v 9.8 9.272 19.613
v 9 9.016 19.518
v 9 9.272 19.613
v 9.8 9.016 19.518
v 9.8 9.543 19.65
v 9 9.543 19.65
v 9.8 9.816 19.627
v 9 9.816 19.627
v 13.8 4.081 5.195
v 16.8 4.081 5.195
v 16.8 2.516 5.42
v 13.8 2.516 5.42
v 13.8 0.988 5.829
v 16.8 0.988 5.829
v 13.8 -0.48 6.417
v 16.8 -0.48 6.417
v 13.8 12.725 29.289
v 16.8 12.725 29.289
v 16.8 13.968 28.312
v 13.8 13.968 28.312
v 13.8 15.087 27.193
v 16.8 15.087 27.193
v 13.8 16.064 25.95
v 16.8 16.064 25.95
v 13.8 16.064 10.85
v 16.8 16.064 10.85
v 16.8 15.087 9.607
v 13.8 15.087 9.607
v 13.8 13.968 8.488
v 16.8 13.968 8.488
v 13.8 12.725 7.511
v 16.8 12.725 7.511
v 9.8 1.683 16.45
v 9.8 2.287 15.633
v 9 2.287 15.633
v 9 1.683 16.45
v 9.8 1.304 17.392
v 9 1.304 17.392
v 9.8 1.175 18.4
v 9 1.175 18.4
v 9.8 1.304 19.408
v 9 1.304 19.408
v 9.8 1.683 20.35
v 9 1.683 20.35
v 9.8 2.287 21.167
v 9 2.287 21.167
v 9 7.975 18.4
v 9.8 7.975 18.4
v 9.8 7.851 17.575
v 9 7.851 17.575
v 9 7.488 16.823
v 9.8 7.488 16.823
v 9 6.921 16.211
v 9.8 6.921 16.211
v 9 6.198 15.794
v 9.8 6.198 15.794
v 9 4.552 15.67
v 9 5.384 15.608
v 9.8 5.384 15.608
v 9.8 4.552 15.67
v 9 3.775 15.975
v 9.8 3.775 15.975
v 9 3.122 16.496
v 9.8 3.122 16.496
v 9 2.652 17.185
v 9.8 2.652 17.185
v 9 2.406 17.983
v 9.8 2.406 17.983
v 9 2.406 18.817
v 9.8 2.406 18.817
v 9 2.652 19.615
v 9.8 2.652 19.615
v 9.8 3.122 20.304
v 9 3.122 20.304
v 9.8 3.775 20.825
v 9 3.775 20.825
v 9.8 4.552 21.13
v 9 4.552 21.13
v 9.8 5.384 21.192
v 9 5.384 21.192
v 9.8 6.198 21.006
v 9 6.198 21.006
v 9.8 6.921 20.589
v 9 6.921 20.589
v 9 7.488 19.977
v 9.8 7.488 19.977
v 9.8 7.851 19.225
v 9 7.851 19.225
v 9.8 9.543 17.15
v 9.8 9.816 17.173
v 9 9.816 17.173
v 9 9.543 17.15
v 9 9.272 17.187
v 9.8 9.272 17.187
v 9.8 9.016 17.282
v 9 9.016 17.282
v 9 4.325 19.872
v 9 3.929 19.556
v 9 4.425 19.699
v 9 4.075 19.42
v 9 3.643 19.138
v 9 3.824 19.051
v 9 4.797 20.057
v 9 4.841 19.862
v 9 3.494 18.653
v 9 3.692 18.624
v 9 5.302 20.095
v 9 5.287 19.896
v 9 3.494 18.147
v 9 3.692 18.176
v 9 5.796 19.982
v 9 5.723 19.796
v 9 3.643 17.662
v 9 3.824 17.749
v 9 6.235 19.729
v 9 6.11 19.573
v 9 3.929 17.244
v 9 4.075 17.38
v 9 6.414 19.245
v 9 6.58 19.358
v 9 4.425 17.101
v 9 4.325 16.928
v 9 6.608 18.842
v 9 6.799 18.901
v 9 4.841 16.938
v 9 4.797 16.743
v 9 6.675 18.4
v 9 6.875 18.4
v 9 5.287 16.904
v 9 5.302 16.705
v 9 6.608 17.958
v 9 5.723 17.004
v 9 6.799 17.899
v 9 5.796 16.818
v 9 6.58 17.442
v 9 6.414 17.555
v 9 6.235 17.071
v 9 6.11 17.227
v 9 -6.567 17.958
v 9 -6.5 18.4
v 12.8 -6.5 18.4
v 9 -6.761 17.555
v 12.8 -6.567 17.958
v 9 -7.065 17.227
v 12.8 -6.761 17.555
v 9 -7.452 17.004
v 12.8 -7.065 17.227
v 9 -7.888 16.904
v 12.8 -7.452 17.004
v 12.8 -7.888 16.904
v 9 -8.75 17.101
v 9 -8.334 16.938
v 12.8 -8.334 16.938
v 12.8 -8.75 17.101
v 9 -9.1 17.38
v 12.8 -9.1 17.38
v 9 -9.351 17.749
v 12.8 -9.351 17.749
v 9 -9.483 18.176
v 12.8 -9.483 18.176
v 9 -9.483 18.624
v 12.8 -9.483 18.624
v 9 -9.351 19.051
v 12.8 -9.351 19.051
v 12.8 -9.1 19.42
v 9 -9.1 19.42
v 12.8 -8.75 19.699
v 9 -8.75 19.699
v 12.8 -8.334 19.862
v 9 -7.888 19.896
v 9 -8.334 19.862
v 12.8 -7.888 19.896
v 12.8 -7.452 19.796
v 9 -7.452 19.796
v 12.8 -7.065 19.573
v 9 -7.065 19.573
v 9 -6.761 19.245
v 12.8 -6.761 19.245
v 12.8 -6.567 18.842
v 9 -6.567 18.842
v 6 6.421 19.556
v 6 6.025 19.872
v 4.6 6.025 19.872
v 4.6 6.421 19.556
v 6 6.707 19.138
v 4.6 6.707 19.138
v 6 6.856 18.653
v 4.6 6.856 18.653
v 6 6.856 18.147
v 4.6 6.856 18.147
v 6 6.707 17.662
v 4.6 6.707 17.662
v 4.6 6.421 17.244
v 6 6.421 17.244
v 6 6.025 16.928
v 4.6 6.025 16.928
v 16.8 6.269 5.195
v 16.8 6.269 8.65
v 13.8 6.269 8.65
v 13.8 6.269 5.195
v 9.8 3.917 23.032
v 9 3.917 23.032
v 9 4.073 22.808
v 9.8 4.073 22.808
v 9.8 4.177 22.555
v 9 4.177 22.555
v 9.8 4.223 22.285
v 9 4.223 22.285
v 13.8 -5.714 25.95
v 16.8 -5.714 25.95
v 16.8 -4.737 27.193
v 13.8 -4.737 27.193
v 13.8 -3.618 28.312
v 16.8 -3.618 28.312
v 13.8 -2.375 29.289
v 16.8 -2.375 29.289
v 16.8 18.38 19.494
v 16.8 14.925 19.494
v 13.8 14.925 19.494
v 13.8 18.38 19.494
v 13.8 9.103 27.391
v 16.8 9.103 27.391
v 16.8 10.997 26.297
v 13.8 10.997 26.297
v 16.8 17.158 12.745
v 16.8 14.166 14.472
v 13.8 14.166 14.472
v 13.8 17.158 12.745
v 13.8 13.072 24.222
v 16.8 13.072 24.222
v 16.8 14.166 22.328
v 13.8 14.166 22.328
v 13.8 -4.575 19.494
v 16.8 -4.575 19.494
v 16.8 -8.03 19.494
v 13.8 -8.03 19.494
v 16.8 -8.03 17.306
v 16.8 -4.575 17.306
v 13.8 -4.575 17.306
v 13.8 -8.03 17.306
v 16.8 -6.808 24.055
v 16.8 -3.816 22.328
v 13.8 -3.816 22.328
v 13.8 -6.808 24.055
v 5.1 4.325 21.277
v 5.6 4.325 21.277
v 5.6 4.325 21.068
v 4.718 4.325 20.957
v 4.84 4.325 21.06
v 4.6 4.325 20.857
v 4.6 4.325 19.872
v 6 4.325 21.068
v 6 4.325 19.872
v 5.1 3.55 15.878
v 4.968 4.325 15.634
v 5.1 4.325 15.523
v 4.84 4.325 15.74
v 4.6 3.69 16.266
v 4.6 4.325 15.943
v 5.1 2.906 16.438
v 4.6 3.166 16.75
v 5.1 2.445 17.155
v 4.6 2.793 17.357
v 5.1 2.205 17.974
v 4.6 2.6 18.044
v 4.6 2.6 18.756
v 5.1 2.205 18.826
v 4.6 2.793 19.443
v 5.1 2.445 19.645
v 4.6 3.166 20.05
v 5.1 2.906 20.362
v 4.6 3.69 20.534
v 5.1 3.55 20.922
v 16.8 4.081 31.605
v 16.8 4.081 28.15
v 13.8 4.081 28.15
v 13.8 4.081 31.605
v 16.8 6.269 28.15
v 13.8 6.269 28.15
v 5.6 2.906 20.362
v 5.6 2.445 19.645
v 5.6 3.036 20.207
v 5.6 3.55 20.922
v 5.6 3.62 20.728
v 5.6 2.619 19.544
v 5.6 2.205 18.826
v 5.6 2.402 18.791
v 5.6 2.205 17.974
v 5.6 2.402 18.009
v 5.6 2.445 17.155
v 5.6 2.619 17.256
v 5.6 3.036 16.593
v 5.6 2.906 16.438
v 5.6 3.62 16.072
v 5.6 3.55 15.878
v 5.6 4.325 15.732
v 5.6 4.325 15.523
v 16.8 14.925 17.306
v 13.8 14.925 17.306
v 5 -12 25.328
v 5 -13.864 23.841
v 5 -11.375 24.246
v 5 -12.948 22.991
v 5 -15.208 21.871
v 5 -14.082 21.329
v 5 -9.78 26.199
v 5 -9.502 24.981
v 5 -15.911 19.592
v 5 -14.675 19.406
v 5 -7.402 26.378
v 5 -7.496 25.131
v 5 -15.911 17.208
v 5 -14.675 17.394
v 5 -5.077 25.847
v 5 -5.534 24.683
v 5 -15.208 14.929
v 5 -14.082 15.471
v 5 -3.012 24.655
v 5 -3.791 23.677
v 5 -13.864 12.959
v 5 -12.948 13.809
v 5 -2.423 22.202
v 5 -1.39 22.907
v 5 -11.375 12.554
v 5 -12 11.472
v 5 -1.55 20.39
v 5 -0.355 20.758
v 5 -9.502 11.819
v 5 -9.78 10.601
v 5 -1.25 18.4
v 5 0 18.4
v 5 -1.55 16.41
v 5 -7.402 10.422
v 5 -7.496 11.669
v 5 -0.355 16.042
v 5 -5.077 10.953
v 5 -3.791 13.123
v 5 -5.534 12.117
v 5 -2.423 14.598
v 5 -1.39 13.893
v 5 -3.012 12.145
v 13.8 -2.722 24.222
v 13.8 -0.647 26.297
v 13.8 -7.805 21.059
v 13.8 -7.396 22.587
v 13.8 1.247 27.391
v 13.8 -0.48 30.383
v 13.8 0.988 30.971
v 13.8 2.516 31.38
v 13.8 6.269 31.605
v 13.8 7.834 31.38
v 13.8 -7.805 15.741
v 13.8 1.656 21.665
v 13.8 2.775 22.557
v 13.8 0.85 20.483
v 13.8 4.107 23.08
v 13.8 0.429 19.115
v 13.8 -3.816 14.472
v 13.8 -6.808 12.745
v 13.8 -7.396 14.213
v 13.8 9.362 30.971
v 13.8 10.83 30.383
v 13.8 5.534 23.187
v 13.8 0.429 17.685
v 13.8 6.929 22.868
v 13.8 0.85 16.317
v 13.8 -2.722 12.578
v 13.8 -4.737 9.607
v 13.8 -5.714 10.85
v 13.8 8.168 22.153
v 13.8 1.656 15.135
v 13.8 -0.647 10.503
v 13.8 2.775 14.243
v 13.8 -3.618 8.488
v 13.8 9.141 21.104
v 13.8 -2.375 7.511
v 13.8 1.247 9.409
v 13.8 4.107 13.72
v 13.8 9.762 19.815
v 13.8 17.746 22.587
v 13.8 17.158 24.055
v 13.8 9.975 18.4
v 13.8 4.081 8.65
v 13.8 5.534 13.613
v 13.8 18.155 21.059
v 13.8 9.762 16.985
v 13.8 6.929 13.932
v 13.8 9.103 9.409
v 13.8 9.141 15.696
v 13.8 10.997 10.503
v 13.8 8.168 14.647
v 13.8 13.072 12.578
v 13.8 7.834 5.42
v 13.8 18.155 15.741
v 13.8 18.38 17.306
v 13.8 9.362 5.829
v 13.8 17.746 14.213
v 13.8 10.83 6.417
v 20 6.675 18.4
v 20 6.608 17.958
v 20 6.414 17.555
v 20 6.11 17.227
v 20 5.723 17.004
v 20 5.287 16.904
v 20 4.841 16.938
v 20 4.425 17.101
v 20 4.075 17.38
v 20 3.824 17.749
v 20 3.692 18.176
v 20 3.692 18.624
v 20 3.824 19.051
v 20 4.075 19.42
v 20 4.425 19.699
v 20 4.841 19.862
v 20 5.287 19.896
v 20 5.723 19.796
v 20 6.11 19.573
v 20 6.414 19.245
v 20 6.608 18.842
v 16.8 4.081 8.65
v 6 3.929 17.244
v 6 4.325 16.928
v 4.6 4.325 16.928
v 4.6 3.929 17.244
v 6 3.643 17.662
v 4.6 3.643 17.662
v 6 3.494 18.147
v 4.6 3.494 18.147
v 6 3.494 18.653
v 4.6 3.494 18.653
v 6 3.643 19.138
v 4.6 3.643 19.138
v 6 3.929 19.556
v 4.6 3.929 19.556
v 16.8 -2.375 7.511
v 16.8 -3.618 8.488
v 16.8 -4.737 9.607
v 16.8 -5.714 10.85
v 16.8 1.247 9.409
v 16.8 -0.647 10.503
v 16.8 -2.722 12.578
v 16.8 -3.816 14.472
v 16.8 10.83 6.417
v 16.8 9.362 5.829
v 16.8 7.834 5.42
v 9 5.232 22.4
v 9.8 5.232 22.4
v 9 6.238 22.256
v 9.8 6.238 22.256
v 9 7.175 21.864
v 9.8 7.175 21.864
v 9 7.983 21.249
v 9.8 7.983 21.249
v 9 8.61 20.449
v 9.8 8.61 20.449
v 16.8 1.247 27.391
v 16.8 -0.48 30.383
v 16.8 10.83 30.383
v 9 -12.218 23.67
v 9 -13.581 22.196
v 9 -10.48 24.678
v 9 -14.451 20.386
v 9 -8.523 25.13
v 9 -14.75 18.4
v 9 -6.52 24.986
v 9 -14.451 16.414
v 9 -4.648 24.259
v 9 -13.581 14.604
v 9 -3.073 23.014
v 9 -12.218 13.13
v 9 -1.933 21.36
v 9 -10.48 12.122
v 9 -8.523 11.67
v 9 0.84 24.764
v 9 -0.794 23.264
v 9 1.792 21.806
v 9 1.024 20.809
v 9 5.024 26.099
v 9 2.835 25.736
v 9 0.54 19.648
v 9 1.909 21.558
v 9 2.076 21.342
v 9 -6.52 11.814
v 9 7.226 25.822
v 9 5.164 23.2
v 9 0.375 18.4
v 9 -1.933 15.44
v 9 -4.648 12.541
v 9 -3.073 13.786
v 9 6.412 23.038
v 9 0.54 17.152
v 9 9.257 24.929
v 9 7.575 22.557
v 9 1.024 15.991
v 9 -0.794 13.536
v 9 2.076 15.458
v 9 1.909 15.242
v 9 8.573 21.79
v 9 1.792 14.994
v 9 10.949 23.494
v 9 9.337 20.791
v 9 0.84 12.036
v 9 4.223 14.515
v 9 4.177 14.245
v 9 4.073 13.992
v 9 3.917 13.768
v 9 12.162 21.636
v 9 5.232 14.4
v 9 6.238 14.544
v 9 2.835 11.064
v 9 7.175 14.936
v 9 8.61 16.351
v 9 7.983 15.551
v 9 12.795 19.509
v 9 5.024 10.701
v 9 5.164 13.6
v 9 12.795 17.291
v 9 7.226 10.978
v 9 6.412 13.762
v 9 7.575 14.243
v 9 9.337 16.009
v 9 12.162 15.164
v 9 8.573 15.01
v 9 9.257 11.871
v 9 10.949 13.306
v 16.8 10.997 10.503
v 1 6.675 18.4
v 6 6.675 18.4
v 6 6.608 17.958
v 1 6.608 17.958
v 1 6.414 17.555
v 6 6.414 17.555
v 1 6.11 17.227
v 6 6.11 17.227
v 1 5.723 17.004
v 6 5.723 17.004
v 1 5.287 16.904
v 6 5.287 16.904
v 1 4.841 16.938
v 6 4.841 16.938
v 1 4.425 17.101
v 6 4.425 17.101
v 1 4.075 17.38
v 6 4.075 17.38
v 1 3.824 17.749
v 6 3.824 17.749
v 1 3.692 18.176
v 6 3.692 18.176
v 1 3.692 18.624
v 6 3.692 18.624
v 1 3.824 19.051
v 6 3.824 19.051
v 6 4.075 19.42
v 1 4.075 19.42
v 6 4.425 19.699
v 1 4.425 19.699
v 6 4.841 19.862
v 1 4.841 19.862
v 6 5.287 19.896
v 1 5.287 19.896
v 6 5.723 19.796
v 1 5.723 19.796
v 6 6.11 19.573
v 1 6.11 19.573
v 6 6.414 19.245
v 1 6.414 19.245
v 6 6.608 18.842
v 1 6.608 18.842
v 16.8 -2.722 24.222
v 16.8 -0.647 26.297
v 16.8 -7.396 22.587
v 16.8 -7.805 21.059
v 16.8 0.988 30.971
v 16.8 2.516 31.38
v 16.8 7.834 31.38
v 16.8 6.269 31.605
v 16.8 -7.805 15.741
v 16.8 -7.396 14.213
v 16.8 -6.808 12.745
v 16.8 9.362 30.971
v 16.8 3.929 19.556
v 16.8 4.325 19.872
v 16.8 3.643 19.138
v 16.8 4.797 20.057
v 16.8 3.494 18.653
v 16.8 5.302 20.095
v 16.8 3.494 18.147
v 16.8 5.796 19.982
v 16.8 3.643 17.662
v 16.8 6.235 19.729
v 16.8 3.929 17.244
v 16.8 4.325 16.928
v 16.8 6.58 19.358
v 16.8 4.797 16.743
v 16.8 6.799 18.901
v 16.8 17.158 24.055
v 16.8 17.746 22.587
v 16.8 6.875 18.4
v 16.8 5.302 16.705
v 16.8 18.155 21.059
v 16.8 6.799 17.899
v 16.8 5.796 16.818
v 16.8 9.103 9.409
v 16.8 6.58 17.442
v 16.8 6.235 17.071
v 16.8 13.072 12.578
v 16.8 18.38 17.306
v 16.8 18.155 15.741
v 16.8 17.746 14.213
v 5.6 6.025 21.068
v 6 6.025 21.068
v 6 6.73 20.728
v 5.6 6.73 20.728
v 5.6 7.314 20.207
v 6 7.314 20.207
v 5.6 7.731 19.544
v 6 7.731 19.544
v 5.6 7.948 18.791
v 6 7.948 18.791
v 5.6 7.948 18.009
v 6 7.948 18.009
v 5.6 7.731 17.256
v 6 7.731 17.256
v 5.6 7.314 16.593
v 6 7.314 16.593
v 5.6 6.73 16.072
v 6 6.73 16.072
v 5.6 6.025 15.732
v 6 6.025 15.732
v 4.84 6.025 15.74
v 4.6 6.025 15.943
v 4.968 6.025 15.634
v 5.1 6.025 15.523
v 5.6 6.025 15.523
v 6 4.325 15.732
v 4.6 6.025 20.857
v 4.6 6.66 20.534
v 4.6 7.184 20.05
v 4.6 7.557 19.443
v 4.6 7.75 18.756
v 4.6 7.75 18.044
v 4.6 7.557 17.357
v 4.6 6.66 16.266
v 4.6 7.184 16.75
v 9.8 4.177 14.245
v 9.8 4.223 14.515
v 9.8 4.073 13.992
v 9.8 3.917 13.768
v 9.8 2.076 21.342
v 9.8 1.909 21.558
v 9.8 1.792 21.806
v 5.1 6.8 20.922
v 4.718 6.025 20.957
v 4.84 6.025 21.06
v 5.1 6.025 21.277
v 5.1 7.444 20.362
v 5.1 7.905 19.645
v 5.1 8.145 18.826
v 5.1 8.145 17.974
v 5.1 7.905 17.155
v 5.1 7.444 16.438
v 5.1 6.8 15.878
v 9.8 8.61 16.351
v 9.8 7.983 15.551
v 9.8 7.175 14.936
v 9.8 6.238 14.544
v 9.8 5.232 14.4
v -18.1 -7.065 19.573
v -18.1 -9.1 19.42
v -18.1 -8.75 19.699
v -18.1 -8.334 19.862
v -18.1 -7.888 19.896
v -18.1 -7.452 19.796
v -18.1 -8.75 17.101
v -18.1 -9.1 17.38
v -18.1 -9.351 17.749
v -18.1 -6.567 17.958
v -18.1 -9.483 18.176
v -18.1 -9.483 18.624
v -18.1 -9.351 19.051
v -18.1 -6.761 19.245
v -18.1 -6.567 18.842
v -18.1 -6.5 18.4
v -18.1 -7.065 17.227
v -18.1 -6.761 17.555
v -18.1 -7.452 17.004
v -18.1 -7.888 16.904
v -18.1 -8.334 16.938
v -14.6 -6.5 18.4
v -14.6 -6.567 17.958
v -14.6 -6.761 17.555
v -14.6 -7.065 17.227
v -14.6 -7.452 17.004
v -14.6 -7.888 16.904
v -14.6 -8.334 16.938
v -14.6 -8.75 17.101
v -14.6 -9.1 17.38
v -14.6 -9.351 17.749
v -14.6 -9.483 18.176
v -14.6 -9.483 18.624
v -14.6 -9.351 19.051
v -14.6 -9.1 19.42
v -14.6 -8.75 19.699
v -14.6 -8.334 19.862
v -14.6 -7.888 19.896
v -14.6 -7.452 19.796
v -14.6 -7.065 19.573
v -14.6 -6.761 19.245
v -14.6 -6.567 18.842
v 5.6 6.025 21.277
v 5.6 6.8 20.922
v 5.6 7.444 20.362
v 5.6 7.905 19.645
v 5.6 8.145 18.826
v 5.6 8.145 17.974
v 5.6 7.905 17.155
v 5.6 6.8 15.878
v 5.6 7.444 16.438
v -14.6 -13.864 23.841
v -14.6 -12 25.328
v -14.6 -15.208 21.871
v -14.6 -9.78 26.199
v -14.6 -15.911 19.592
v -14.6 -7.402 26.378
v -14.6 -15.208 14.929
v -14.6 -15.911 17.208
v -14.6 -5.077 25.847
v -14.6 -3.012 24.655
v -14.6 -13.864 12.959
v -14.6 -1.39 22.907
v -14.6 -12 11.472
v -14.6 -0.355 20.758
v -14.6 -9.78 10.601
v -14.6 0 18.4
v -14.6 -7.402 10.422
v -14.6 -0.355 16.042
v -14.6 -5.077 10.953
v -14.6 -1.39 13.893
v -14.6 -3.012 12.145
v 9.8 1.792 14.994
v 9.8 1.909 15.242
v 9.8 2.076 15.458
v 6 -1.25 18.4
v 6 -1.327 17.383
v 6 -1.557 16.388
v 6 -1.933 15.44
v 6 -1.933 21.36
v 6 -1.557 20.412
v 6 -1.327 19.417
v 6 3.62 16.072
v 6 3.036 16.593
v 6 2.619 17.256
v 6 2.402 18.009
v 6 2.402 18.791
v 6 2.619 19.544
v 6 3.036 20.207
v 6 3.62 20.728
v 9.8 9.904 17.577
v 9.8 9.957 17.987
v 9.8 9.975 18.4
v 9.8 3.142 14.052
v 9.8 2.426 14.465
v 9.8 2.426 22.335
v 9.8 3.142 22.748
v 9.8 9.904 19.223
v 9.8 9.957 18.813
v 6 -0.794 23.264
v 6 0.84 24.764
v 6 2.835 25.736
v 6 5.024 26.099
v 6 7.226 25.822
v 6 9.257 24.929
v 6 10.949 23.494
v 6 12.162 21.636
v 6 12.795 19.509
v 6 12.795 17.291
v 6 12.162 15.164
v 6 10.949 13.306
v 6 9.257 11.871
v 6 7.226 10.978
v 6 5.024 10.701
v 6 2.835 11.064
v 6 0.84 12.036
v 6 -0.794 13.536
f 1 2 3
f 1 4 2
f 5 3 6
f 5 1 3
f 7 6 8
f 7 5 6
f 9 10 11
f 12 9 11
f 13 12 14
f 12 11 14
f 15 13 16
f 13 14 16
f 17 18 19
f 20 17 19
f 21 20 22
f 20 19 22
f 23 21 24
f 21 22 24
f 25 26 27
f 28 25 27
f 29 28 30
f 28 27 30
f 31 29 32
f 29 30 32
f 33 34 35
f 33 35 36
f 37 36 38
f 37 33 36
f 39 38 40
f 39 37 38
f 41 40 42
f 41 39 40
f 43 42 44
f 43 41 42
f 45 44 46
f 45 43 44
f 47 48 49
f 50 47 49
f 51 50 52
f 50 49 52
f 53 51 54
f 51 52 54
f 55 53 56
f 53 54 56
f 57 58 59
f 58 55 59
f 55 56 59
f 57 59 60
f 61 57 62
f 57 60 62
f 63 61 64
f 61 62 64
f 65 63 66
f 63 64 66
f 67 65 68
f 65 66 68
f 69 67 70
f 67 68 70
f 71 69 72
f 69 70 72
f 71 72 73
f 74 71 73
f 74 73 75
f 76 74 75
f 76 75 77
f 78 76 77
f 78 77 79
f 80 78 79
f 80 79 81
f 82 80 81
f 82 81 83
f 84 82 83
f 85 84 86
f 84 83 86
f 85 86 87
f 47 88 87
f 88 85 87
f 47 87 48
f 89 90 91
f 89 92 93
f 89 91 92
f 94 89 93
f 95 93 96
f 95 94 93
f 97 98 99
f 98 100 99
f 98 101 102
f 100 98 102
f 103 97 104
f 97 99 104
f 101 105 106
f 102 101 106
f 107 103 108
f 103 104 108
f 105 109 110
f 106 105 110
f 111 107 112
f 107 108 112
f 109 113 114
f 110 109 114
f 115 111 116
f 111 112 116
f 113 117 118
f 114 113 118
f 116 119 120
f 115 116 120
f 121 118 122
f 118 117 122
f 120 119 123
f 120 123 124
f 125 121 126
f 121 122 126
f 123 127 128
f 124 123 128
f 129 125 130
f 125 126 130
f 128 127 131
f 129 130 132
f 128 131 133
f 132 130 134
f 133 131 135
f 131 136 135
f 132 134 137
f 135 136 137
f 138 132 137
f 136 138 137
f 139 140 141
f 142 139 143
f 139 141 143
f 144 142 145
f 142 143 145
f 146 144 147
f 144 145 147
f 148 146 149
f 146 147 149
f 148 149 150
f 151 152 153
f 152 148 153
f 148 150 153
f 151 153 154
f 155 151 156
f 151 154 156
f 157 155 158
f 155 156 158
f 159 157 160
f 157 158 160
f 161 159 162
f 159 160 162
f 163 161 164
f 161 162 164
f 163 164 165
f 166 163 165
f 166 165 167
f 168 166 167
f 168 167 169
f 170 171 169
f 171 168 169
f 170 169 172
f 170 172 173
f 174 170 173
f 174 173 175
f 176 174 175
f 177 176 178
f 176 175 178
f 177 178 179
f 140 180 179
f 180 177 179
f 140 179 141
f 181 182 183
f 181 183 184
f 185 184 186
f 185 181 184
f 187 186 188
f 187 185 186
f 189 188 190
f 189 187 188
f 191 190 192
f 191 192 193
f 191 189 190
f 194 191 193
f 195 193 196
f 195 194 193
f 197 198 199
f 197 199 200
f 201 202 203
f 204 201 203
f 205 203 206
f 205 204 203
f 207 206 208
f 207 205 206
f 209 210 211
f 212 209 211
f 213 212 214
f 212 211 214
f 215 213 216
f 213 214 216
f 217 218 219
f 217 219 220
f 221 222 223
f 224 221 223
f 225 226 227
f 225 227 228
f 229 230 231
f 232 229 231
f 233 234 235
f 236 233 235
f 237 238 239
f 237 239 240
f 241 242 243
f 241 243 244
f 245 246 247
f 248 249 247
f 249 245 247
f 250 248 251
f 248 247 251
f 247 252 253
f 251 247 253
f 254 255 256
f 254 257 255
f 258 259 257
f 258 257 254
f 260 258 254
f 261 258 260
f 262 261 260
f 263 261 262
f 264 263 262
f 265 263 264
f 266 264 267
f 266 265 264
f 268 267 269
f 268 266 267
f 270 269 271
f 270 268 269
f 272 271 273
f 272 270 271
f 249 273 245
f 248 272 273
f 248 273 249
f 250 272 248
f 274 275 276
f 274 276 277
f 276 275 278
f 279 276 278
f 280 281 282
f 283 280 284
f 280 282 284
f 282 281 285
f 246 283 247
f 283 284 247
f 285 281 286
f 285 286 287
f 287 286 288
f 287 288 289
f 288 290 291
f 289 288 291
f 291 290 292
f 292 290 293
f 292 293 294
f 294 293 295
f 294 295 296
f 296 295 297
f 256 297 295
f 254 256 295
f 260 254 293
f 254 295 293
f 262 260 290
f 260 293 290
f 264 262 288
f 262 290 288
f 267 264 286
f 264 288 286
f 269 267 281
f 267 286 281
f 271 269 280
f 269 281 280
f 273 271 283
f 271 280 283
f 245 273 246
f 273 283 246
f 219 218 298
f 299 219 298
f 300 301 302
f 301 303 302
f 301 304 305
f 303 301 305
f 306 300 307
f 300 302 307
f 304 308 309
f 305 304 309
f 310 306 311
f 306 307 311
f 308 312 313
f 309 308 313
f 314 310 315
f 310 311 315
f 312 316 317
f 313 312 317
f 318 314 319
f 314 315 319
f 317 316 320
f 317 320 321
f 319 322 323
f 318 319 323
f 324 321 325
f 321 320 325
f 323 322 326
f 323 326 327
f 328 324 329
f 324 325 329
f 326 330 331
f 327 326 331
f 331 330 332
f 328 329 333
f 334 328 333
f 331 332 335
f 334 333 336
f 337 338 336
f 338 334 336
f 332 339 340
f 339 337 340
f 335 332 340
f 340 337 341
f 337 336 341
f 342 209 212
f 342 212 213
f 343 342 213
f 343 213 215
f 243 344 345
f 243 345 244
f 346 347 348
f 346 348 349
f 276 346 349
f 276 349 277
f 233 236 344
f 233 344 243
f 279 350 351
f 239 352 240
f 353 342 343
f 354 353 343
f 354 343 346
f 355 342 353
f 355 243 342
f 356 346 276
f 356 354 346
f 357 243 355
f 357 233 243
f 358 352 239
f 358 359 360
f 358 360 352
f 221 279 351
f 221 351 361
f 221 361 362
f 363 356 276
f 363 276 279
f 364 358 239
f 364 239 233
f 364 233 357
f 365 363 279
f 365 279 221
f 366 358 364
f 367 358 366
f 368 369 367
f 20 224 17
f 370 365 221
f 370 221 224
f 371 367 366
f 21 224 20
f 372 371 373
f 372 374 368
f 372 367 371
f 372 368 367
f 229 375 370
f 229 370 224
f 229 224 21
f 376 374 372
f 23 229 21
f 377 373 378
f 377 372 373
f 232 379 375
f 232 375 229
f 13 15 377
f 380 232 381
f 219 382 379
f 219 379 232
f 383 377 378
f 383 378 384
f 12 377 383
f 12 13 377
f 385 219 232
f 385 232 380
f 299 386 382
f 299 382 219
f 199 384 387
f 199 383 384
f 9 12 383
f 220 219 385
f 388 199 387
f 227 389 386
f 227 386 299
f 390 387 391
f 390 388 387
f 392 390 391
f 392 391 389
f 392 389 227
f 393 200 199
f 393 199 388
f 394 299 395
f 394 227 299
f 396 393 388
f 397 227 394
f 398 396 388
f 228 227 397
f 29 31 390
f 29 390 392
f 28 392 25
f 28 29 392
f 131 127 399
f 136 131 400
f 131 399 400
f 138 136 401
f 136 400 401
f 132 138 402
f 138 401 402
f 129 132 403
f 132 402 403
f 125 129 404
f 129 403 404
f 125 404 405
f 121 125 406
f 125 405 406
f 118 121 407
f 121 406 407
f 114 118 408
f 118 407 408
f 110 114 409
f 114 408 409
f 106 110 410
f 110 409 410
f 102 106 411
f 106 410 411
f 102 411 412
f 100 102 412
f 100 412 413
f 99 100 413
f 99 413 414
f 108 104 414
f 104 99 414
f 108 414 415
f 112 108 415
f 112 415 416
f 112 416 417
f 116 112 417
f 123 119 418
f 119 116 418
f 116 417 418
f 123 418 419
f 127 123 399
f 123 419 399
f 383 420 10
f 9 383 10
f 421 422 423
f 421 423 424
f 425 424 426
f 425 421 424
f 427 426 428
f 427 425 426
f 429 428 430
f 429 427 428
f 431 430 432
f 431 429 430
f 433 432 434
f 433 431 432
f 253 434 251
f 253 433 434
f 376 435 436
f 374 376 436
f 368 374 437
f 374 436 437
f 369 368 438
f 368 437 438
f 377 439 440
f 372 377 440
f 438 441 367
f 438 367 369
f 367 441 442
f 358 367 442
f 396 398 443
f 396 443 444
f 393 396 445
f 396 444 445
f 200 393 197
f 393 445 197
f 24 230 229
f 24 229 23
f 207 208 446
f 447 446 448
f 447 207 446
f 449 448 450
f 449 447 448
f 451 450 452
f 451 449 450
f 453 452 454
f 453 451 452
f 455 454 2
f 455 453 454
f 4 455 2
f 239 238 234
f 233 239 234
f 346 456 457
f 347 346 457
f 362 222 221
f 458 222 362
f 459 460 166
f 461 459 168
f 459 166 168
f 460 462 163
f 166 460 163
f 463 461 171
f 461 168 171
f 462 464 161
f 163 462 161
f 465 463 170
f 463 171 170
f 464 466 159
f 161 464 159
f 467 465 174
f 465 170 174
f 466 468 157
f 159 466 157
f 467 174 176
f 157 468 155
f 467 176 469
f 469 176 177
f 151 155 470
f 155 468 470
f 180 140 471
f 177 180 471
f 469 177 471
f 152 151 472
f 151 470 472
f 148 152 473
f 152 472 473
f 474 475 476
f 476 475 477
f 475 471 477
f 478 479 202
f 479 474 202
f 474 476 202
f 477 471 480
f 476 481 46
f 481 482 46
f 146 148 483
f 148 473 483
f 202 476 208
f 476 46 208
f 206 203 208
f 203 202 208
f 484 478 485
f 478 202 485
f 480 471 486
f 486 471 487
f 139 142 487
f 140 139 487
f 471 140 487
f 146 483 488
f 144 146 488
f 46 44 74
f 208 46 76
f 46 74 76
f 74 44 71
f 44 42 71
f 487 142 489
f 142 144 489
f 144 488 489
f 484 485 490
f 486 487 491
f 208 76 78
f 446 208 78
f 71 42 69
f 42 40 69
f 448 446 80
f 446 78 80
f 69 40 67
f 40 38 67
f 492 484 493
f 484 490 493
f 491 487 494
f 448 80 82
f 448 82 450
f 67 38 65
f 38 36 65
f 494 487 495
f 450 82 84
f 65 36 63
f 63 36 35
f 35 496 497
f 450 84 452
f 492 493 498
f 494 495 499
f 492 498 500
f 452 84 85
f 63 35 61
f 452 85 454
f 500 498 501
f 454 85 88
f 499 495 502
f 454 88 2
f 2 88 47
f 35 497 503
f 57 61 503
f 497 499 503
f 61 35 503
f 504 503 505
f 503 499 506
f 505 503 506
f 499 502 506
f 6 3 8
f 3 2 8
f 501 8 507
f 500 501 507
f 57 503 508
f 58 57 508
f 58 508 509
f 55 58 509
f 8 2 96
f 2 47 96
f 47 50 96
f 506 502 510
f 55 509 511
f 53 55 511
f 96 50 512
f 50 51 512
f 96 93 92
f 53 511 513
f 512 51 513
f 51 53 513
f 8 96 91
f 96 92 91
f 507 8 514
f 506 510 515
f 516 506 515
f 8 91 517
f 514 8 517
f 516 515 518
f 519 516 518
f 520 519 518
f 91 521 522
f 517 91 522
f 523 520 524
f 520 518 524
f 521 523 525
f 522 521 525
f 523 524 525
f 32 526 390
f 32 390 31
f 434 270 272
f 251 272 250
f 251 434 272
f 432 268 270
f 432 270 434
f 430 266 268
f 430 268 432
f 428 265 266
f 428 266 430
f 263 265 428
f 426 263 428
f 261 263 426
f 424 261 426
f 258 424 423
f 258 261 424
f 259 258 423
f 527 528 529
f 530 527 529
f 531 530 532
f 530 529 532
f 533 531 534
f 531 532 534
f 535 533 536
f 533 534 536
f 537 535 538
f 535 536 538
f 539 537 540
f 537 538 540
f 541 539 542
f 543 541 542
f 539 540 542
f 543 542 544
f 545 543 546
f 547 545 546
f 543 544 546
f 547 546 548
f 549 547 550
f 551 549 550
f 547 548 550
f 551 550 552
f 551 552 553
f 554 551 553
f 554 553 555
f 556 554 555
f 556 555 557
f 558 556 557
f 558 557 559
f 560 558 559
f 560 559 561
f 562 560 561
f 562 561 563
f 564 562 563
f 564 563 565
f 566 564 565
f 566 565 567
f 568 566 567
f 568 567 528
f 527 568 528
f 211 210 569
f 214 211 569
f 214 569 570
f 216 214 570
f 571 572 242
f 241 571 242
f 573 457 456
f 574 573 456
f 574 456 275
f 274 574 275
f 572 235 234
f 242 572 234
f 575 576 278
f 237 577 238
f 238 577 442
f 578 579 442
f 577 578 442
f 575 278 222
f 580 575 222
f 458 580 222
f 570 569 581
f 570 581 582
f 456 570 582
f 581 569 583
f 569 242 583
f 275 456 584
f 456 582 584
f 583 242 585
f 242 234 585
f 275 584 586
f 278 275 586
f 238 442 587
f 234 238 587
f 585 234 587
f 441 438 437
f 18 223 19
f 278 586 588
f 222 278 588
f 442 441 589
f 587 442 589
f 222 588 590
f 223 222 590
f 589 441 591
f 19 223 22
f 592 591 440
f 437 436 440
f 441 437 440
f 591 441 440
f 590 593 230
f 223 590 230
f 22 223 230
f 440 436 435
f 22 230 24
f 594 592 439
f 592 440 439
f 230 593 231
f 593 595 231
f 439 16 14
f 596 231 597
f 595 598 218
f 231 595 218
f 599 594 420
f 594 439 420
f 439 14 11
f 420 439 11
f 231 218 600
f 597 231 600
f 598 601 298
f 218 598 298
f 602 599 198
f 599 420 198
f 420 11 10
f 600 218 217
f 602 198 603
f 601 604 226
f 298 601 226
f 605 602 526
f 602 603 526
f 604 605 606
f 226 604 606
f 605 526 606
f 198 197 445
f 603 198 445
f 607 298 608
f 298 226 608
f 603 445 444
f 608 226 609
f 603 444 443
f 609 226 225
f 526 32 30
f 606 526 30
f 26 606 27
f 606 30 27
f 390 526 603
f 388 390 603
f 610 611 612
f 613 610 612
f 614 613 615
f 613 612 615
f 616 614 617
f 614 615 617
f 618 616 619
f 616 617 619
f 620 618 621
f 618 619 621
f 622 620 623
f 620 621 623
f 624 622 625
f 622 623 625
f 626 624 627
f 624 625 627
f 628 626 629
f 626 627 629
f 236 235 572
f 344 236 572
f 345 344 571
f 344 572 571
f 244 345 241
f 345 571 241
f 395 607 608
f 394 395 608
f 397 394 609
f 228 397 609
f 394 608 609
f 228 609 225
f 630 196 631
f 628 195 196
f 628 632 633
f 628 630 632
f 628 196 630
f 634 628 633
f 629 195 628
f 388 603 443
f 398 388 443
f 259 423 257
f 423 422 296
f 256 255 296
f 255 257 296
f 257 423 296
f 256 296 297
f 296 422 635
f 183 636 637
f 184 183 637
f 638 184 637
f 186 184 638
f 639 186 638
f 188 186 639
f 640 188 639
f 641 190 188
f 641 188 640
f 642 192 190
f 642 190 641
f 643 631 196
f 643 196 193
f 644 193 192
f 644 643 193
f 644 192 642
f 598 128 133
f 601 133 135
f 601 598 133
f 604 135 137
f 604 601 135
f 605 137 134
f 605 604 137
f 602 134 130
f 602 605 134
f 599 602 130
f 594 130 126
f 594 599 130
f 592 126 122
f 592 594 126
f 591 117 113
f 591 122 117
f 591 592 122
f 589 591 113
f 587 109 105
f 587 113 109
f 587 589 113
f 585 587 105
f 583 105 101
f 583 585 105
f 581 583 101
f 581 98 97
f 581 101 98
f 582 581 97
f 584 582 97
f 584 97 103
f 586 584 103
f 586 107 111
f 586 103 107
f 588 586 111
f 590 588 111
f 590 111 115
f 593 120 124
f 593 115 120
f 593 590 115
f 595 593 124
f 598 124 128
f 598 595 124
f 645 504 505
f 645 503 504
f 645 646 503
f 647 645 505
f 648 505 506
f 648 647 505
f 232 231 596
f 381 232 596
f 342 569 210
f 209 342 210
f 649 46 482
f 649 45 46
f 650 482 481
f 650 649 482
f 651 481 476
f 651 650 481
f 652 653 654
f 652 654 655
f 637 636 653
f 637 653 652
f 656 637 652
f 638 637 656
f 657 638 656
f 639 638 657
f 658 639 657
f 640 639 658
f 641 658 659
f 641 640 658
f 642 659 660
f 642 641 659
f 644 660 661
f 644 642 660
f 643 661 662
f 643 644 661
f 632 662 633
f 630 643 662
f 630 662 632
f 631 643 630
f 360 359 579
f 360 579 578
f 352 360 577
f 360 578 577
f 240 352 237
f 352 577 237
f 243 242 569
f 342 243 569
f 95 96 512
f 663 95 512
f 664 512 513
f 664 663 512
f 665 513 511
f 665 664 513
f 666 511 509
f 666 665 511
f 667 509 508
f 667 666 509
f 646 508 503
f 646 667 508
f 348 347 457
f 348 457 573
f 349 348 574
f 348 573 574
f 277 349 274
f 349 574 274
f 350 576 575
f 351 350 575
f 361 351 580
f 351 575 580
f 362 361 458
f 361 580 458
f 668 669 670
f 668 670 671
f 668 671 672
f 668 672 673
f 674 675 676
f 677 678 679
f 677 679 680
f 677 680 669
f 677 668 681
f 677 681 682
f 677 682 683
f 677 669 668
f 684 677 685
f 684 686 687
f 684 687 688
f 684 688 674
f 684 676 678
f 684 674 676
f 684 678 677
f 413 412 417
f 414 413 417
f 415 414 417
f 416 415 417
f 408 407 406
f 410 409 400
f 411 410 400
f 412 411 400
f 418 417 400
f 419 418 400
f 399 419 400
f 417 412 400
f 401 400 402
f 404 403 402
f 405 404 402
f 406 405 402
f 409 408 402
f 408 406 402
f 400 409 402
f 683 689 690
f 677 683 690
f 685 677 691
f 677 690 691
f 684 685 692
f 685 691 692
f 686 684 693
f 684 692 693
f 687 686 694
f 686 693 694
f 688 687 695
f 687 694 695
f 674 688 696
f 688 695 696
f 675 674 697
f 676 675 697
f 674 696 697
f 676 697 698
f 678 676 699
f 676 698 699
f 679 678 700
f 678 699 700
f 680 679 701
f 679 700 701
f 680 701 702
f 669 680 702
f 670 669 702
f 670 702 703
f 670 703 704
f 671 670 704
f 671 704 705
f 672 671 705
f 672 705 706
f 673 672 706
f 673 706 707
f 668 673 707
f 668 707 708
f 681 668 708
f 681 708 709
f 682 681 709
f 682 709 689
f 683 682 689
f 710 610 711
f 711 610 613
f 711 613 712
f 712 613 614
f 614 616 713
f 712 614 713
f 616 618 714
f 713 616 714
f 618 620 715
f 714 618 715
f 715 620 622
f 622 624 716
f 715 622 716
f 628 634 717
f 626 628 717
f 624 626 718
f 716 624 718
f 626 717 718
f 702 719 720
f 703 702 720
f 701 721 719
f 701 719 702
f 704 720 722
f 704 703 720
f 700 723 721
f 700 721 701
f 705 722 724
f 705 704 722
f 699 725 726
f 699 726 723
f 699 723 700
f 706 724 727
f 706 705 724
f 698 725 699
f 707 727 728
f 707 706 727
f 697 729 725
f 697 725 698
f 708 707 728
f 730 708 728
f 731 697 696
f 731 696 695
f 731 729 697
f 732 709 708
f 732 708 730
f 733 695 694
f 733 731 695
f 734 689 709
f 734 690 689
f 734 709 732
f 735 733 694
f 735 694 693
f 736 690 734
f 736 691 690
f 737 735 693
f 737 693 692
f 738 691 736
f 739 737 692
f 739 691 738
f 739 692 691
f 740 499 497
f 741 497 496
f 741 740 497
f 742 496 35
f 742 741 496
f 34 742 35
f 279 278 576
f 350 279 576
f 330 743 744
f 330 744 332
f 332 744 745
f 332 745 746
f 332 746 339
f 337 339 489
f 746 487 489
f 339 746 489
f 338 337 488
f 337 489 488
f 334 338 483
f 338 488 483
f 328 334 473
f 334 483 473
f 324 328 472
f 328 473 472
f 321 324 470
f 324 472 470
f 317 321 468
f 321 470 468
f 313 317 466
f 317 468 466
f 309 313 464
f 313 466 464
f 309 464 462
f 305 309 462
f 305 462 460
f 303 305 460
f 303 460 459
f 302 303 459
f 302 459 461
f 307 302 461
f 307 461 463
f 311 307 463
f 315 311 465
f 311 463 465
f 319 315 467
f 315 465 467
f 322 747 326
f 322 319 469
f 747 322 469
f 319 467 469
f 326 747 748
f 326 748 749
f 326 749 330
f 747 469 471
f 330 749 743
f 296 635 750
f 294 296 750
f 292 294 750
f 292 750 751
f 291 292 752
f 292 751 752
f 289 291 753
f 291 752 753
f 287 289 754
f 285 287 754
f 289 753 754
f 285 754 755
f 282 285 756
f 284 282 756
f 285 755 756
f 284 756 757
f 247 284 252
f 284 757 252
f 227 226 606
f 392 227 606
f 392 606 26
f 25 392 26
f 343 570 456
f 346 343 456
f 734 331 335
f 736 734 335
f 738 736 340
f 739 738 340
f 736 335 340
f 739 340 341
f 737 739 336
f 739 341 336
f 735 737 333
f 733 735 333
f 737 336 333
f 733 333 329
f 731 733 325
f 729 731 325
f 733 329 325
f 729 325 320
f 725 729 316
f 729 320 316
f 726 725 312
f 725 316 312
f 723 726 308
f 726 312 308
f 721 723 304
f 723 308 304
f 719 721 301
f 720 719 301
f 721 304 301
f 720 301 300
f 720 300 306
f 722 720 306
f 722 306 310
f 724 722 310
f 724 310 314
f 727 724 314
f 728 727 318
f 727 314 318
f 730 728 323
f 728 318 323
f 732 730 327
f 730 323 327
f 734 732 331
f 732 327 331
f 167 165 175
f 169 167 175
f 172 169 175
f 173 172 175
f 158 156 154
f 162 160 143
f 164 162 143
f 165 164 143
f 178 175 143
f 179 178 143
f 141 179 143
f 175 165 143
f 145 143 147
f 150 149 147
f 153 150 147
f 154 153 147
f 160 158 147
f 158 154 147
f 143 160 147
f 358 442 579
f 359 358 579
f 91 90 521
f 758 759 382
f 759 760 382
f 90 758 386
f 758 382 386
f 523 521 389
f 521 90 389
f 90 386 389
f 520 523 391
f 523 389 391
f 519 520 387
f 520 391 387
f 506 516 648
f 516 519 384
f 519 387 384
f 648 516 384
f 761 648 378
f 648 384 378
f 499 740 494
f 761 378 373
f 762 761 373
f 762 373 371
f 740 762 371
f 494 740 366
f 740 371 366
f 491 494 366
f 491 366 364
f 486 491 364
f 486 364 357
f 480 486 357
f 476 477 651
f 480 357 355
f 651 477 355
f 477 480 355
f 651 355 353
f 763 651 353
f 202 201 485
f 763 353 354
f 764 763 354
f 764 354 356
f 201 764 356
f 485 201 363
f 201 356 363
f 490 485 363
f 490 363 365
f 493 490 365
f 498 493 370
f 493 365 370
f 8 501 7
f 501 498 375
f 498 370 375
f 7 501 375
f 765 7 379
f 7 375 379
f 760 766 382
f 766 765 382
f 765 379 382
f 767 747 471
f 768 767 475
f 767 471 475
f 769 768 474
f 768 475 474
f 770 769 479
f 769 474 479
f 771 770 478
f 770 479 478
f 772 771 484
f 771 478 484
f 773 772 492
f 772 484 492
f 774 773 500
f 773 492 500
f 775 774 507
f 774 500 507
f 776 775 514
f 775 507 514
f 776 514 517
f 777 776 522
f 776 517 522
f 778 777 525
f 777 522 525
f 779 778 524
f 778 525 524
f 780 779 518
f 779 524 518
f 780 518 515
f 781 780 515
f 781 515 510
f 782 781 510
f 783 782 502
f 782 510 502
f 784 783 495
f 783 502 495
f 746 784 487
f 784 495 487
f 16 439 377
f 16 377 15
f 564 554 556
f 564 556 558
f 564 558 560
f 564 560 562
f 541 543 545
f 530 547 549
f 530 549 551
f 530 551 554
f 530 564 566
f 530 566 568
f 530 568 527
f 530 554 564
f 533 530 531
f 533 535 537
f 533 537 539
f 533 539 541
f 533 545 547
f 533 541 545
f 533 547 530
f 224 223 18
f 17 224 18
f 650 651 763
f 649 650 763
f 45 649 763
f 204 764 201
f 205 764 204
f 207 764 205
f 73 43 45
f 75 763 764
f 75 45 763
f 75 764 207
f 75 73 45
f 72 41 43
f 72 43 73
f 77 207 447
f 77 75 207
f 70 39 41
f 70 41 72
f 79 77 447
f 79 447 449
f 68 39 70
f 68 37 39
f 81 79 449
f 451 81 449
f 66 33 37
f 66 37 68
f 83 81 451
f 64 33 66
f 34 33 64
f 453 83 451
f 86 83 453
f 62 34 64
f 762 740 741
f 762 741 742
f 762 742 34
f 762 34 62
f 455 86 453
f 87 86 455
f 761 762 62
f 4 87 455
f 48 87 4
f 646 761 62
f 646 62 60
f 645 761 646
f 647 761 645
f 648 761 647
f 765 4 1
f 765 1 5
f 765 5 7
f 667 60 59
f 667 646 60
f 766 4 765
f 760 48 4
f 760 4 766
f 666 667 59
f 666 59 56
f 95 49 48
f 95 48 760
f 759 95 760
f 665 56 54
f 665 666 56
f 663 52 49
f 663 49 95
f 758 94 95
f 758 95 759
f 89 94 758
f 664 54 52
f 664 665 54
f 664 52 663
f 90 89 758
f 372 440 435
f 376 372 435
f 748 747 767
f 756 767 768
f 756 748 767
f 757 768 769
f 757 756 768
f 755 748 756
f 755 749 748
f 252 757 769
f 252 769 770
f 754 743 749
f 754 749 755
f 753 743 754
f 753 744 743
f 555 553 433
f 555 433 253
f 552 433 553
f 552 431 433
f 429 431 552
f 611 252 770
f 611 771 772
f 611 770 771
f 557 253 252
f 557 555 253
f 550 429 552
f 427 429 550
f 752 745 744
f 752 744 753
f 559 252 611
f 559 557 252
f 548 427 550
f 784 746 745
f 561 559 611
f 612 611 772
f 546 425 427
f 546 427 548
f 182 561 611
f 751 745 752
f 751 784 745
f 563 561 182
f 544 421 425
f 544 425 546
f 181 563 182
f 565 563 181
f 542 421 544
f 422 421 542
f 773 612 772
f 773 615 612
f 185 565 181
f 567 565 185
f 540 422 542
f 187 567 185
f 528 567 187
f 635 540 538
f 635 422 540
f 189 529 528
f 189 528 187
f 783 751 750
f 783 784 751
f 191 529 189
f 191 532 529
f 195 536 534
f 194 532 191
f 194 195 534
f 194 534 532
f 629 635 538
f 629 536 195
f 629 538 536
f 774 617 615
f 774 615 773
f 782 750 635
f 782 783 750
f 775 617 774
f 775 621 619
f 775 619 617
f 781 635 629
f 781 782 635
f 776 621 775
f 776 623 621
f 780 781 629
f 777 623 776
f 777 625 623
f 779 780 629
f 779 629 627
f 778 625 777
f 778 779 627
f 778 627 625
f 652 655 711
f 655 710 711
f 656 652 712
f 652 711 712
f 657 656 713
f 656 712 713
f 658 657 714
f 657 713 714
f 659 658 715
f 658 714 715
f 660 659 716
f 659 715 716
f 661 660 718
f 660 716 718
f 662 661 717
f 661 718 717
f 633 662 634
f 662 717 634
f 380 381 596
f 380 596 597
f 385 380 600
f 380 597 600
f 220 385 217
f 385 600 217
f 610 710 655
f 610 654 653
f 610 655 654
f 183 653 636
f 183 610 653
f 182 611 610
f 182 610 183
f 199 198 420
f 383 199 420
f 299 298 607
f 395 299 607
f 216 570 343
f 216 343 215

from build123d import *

# Parameters (mm, degrees)
CYLINDER005_R               = 1.5
CYLINDER005_DEPTH           = 30.9
CYLINDER006_R               = 8
CYLINDER006_DEPTH           = 19.6
CUBE008_W                   = 1.7
CUBE008_H                   = 6
CUBE008_DEPTH               = 8
CYLINDER016_R               = 1.25
CYLINDER016_DEPTH           = 1
CYLINDER017_R               = 1.25
CYLINDER017_DEPTH           = 1
CYLINDER017_PLACEMENT_ANGLE = 120
CYLINDER018_R               = 1.25
CYLINDER018_DEPTH           = 1
CYLINDER018_PLACEMENT_ANGLE = 240
CUBE010_W                   = 7
CUBE010_H                   = 2.1875
CUBE010_DEPTH               = 3
CUBE010_PLACEMENT_ANGLE     = 30
CUBE011_W                   = 7
CUBE011_H                   = 2.1875
CUBE011_DEPTH               = 3
CUBE011_PLACEMENT_ANGLE     = 60
CUBE012_W                   = 7
CUBE012_H                   = 2.1875
CUBE012_DEPTH               = 3
CUBE013_W                   = 7
CUBE013_H                   = 2.1875
CUBE013_DEPTH               = 3
CUBE013_PLACEMENT_ANGLE     = 120
CUBE014_W                   = 7
CUBE014_H                   = 2.1875
CUBE014_DEPTH               = 3
CUBE014_PLACEMENT_ANGLE     = 150
CUBE015_W                   = 7
CUBE015_H                   = 2.1875
CUBE015_DEPTH               = 3
CUBE016_W                   = 7
CUBE016_H                   = 2.1875
CUBE016_DEPTH               = 3
CUBE016_PLACEMENT_ANGLE     = 210
CUBE017_W                   = 7
CUBE017_H                   = 2.1875
CUBE017_DEPTH               = 3
CUBE017_PLACEMENT_ANGLE     = 240
CUBE018_W                   = 7
CUBE018_H                   = 2.1875
CUBE018_DEPTH               = 3
CUBE019_W                   = 7
CUBE019_H                   = 2.1875
CUBE019_DEPTH               = 3
CUBE019_PLACEMENT_ANGLE     = 60
CUBE020_W                   = 7
CUBE020_H                   = 2.1875
CUBE020_DEPTH               = 3
CUBE020_PLACEMENT_ANGLE     = 30
CUBE021_W                   = 7
CUBE021_H                   = 2.1875
CUBE021_DEPTH               = 3
CUBE009_W                   = 7
CUBE009_H                   = 2.1875
CUBE009_DEPTH               = 3
CYLINDER015_R               = 1.7
CYLINDER015_DEPTH           = 22.4
CYLINDER009_R               = 3
CYLINDER009_DEPTH           = 0.5
CYLINDER010_R               = 2.8
CYLINDER010_DEPTH           = 11.2
CYLINDER011_R               = 4
CYLINDER011_DEPTH           = 7
CYLINDER013_R               = 4
CYLINDER013_DEPTH           = 8
CYLINDER012_R               = 4.8
CYLINDER012_DEPTH           = 8
CYLINDER014_R               = 13.25
CYLINDER014_DEPTH           = 3
CYLINDER019_R               = 1.5
CYLINDER019_DEPTH           = 19
CYLINDER007_R               = 7.7
CYLINDER007_DEPTH           = 3
CYLINDER004_R               = 6.75
CYLINDER004_DEPTH           = 4
GROUP004_ROLL_ANGLE         = -90
GROUP004_PLACEMENT_ANGLE    = 90


with BuildPart() as cylinder005:
    # cylinder005 → cylinder005 (new body)
    with BuildSketch(Plane.XY.offset(-3.8)):
        Circle(CYLINDER005_R)
    extrude(amount=CYLINDER005_DEPTH)


with BuildPart() as cylinder006:
    # cylinder006 → cylinder006 (new body)
    with BuildSketch(Plane.XY.offset(4)):
        Circle(CYLINDER006_R)
    extrude(amount=CYLINDER006_DEPTH)


with BuildPart() as cube008:
    # cube008 → cube008 (new body)
    with BuildSketch(Plane(origin=(-0.85, -3, 8), x_dir=(1, 0, 0), z_dir=(0, 0, 1))):
        with Locations((0.85, 3)):
            Rectangle(CUBE008_W, CUBE008_H)
    extrude(amount=CUBE008_DEPTH)


with BuildPart() as cylinder016:
    # cylinder016 → cylinder016 (new body)
    with BuildSketch(Plane(origin=(4.4, 0, 7), x_dir=(1, 0, 0), z_dir=(0, 0, 1))):
        Circle(CYLINDER016_R)
    extrude(amount=CYLINDER016_DEPTH)


with BuildPart() as cylinder017:
    # cylinder017 → cylinder017 (new body)
    with BuildSketch(Plane.XY):
        Circle(CYLINDER017_R)
    extrude(amount=CYLINDER017_DEPTH)


with BuildPart() as cylinder017_1:
    # cylinder017 placement: moved
    add(cylinder017.part.moved(Location((-2.2, 3.810512, 7))).rotate(Axis((-2.2, 3.810512, 7), (0, 0, 1)), CYLINDER017_PLACEMENT_ANGLE))


with BuildPart() as cylinder018:
    # cylinder018 → cylinder018 (new body)
    with BuildSketch(Plane.XY):
        Circle(CYLINDER018_R)
    extrude(amount=CYLINDER018_DEPTH)


with BuildPart() as cylinder018_1:
    # cylinder018 placement: moved
    add(cylinder018.part.moved(Location((-2.2, -3.810512, 7))).rotate(Axis((-2.2, -3.810512, 7), (0, 0, 1)), CYLINDER018_PLACEMENT_ANGLE))


with BuildPart() as cube010:
    # cube010 → cube010 (new body)
    with BuildSketch(Plane.XY):
        with Locations((3.5, 1.09375)):
            Rectangle(CUBE010_W, CUBE010_H)
    extrude(amount=CUBE010_DEPTH)


with BuildPart() as cube010_1:
    # cube010 placement: moved
    add(cube010.part.moved(Location((8.990623, 3.927785, 0))).rotate(Axis((8.990623, 3.927785, 0), (0, 0, 1)), CUBE010_PLACEMENT_ANGLE))


with BuildPart() as cube011:
    # cube011 → cube011 (new body)
    with BuildSketch(Plane.XY):
        with Locations((3.5, 1.09375)):
            Rectangle(CUBE011_W, CUBE011_H)
    extrude(amount=CUBE011_DEPTH)


with BuildPart() as cube011_1:
    # cube011 placement: moved
    add(cube011.part.moved(Location((5.822215, 7.896873, 0))).rotate(Axis((5.822215, 7.896873, 0), (0, 0, 1)), CUBE011_PLACEMENT_ANGLE))


with BuildPart() as cube012:
    # cube012 → cube012 (new body)
    with BuildSketch(Plane(origin=(1.09375, 9.75, 0), x_dir=(0, 1, 0), z_dir=(0, 0, 1))):
        with Locations((3.5, 1.09375)):
            Rectangle(CUBE012_W, CUBE012_H)
    extrude(amount=CUBE012_DEPTH)


with BuildPart() as cube013:
    # cube013 → cube013 (new body)
    with BuildSketch(Plane.XY):
        with Locations((3.5, 1.09375)):
            Rectangle(CUBE013_W, CUBE013_H)
    extrude(amount=CUBE013_DEPTH)


with BuildPart() as cube013_1:
    # cube013 placement: moved
    add(cube013.part.moved(Location((-3.927785, 8.990623, 0))).rotate(Axis((-3.927785, 8.990623, 0), (0, 0, 1)), CUBE013_PLACEMENT_ANGLE))


with BuildPart() as cube014:
    # cube014 → cube014 (new body)
    with BuildSketch(Plane.XY):
        with Locations((3.5, 1.09375)):
            Rectangle(CUBE014_W, CUBE014_H)
    extrude(amount=CUBE014_DEPTH)


with BuildPart() as cube014_1:
    # cube014 placement: moved
    add(cube014.part.moved(Location((-7.896873, 5.822215, 0))).rotate(Axis((-7.896873, 5.822215, 0), (0, 0, 1)), CUBE014_PLACEMENT_ANGLE))


with BuildPart() as cube015:
    # cube015 → cube015 (new body)
    with BuildSketch(Plane(origin=(-9.75, 1.09375, 0), x_dir=(-1, 0, 0), z_dir=(0, 0, 1))):
        with Locations((3.5, 1.09375)):
            Rectangle(CUBE015_W, CUBE015_H)
    extrude(amount=CUBE015_DEPTH)


with BuildPart() as cube016:
    # cube016 → cube016 (new body)
    with BuildSketch(Plane.XY):
        with Locations((3.5, 1.09375)):
            Rectangle(CUBE016_W, CUBE016_H)
    extrude(amount=CUBE016_DEPTH)


with BuildPart() as cube016_1:
    # cube016 placement: moved
    add(cube016.part.moved(Location((-8.990623, -3.927785, 0))).rotate(Axis((-8.990623, -3.927785, 0), (0, 0, 1)), CUBE016_PLACEMENT_ANGLE))


with BuildPart() as cube017:
    # cube017 → cube017 (new body)
    with BuildSketch(Plane.XY):
        with Locations((3.5, 1.09375)):
            Rectangle(CUBE017_W, CUBE017_H)
    extrude(amount=CUBE017_DEPTH)


with BuildPart() as cube017_1:
    # cube017 placement: moved
    add(cube017.part.moved(Location((-5.822215, -7.896873, 0))).rotate(Axis((-5.822215, -7.896873, 0), (0, 0, 1)), CUBE017_PLACEMENT_ANGLE))


with BuildPart() as cube018:
    # cube018 → cube018 (new body)
    with BuildSketch(Plane(origin=(-1.09375, -9.75, 0), x_dir=(0, -1, 0), z_dir=(0, 0, 1))):
        with Locations((3.5, 1.09375)):
            Rectangle(CUBE018_W, CUBE018_H)
    extrude(amount=CUBE018_DEPTH)


with BuildPart() as cube019:
    # cube019 → cube019 (new body)
    with BuildSketch(Plane.XY):
        with Locations((3.5, 1.09375)):
            Rectangle(CUBE019_W, CUBE019_H)
    extrude(amount=CUBE019_DEPTH)


with BuildPart() as cube019_1:
    # cube019 placement: moved
    add(cube019.part.moved(Location((3.927785, -8.990623, 0))).rotate(Axis((3.927785, -8.990623, 0), (0, 0, -1)), CUBE019_PLACEMENT_ANGLE))


with BuildPart() as cube020:
    # cube020 → cube020 (new body)
    with BuildSketch(Plane.XY):
        with Locations((3.5, 1.09375)):
            Rectangle(CUBE020_W, CUBE020_H)
    extrude(amount=CUBE020_DEPTH)


with BuildPart() as cube020_1:
    # cube020 placement: moved
    add(cube020.part.moved(Location((7.896873, -5.822215, 0))).rotate(Axis((7.896873, -5.822215, 0), (0, 0, -1)), CUBE020_PLACEMENT_ANGLE))


with BuildPart() as cube021:
    # cube021 → cube021 (new body)
    with BuildSketch(Plane(origin=(9.75, -1.09375, 0), x_dir=(1, 0, 0), z_dir=(0, 0, 1))):
        with Locations((3.5, 1.09375)):
            Rectangle(CUBE021_W, CUBE021_H)
    extrude(amount=CUBE021_DEPTH)


with BuildPart() as group003:
    # cube009 → cube009 (new body)
    with BuildSketch(Plane(origin=(9.75, -1.09375, 0), x_dir=(1, 0, 0), z_dir=(0, 0, 1))):
        with Locations((3.5, 1.09375)):
            Rectangle(CUBE009_W, CUBE009_H)
    extrude(amount=CUBE009_DEPTH)

    # Group003: union cube010, cube011, cube012, cube013, cube014, cube015, cube016, cube017, cube018, cube019, cube020, cube021
    add(cube010_1.part)
    add(cube011_1.part)
    add(cube012.part)
    add(cube013_1.part)
    add(cube014_1.part)
    add(cube015.part)
    add(cube016_1.part)
    add(cube017_1.part)
    add(cube018.part)
    add(cube019_1.part)
    add(cube020_1.part)
    add(cube021.part)


with BuildPart() as union002:
    # cylinder015 → cylinder015 (new body)
    with BuildSketch(Plane.XY):
        Circle(CYLINDER015_R)
    extrude(amount=CYLINDER015_DEPTH)

    # union002: union cube008, cylinder016, cylinder017, cylinder018, Group003
    add(cube008.part)
    add(cylinder016.part)
    add(cylinder017_1.part)
    add(cylinder018_1.part)
    add(group003.part)


with BuildPart() as cylinder009:
    # cylinder009 → cylinder009 (new body)
    with BuildSketch(Plane.XY.offset(11.2)):
        Circle(CYLINDER009_R)
    extrude(amount=CYLINDER009_DEPTH)


with BuildPart() as cylinder010:
    # cylinder010 → cylinder010 (new body)
    with BuildSketch(Plane.XY):
        Circle(CYLINDER010_R)
    extrude(amount=CYLINDER010_DEPTH)


with BuildPart() as cylinder011:
    # cylinder011 → cylinder011 (new body)
    with BuildSketch(Plane.XY):
        Circle(CYLINDER011_R)
    extrude(amount=CYLINDER011_DEPTH)


with BuildPart() as cylinder013:
    # cylinder013 → cylinder013 (new body)
    with BuildSketch(Plane.XY):
        Circle(CYLINDER013_R)
    extrude(amount=CYLINDER013_DEPTH)


with BuildPart() as difference001:
    # cylinder012 → cylinder012 (new body)
    with BuildSketch(Plane.XY):
        Circle(CYLINDER012_R)
    extrude(amount=CYLINDER012_DEPTH)

    # difference001: cut cylinder013
    add(cylinder013.part, mode=Mode.SUBTRACT)


with BuildPart() as cylinder014:
    # cylinder014 → cylinder014 (new body)
    with BuildSketch(Plane.XY):
        Circle(CYLINDER014_R)
    extrude(amount=CYLINDER014_DEPTH)


with BuildPart() as difference002:
    # cylinder008 → cylinder008 (revolve)
    with BuildSketch(Plane(origin=(0, 0, 11.7), x_dir=(1, 0, 0), z_dir=(0, -1, 0))):
        Polygon((0, 0), (3, 0), (2.6, 0.5), (0, 0.5), align=None)
    revolve(axis=Axis((0, 0, 11.7), (0, 0, 1)))

    # union001: union cylinder009, cylinder010, cylinder011, difference001, cylinder014
    add(cylinder009.part)
    add(cylinder010.part)
    add(cylinder011.part)
    add(difference001.part)
    add(cylinder014.part)

    # difference002: cut union002
    add(union002.part, mode=Mode.SUBTRACT)


with BuildPart() as difference002_1:
    # difference002 placement: moved
    add(difference002.part.moved(Location((0, 0, -7.8))))


with BuildPart() as cylinder019:
    # cylinder019 → cylinder019 (new body)
    with BuildSketch(Plane.XY.offset(-11)):
        Circle(CYLINDER019_R)
    extrude(amount=CYLINDER019_DEPTH)


with BuildPart() as matrix_union:
    # cylinder007 → cylinder007 (new body)
    with BuildSketch(Plane.XY):
        Circle(CYLINDER007_R)
    extrude(amount=CYLINDER007_DEPTH)

    # Matrix_Union: union difference002, cylinder019
    add(difference002_1.part)
    add(cylinder019.part)


with BuildPart() as matrix_union_1:
    # Matrix_Union placement: moved
    add(matrix_union.part.moved(Location((13.175, 0, 0))))


with BuildPart() as gearset:
    # cylinder004 → cylinder004 (new body)
    with BuildSketch(Plane.XY):
        Circle(CYLINDER004_R)
    extrude(amount=CYLINDER004_DEPTH)

    # Group004: union cylinder005, cylinder006, Matrix_Union
    add(cylinder005.part)
    add(cylinder006.part)
    add(matrix_union_1.part)


with BuildPart() as gearset_1:
    # Group004 roll: moved
    add(gearset.part.rotate(Axis((0, 0, 0), (1, 0, 0)), GROUP004_ROLL_ANGLE))


with BuildPart() as gearset_2:
    # Group004 placement: moved
    add(gearset_1.part.moved(Location((9, -8, 18.4))).rotate(Axis((9, -8, 18.4), (0, 0, 1)), GROUP004_PLACEMENT_ANGLE))


solid = gearset_2.part
